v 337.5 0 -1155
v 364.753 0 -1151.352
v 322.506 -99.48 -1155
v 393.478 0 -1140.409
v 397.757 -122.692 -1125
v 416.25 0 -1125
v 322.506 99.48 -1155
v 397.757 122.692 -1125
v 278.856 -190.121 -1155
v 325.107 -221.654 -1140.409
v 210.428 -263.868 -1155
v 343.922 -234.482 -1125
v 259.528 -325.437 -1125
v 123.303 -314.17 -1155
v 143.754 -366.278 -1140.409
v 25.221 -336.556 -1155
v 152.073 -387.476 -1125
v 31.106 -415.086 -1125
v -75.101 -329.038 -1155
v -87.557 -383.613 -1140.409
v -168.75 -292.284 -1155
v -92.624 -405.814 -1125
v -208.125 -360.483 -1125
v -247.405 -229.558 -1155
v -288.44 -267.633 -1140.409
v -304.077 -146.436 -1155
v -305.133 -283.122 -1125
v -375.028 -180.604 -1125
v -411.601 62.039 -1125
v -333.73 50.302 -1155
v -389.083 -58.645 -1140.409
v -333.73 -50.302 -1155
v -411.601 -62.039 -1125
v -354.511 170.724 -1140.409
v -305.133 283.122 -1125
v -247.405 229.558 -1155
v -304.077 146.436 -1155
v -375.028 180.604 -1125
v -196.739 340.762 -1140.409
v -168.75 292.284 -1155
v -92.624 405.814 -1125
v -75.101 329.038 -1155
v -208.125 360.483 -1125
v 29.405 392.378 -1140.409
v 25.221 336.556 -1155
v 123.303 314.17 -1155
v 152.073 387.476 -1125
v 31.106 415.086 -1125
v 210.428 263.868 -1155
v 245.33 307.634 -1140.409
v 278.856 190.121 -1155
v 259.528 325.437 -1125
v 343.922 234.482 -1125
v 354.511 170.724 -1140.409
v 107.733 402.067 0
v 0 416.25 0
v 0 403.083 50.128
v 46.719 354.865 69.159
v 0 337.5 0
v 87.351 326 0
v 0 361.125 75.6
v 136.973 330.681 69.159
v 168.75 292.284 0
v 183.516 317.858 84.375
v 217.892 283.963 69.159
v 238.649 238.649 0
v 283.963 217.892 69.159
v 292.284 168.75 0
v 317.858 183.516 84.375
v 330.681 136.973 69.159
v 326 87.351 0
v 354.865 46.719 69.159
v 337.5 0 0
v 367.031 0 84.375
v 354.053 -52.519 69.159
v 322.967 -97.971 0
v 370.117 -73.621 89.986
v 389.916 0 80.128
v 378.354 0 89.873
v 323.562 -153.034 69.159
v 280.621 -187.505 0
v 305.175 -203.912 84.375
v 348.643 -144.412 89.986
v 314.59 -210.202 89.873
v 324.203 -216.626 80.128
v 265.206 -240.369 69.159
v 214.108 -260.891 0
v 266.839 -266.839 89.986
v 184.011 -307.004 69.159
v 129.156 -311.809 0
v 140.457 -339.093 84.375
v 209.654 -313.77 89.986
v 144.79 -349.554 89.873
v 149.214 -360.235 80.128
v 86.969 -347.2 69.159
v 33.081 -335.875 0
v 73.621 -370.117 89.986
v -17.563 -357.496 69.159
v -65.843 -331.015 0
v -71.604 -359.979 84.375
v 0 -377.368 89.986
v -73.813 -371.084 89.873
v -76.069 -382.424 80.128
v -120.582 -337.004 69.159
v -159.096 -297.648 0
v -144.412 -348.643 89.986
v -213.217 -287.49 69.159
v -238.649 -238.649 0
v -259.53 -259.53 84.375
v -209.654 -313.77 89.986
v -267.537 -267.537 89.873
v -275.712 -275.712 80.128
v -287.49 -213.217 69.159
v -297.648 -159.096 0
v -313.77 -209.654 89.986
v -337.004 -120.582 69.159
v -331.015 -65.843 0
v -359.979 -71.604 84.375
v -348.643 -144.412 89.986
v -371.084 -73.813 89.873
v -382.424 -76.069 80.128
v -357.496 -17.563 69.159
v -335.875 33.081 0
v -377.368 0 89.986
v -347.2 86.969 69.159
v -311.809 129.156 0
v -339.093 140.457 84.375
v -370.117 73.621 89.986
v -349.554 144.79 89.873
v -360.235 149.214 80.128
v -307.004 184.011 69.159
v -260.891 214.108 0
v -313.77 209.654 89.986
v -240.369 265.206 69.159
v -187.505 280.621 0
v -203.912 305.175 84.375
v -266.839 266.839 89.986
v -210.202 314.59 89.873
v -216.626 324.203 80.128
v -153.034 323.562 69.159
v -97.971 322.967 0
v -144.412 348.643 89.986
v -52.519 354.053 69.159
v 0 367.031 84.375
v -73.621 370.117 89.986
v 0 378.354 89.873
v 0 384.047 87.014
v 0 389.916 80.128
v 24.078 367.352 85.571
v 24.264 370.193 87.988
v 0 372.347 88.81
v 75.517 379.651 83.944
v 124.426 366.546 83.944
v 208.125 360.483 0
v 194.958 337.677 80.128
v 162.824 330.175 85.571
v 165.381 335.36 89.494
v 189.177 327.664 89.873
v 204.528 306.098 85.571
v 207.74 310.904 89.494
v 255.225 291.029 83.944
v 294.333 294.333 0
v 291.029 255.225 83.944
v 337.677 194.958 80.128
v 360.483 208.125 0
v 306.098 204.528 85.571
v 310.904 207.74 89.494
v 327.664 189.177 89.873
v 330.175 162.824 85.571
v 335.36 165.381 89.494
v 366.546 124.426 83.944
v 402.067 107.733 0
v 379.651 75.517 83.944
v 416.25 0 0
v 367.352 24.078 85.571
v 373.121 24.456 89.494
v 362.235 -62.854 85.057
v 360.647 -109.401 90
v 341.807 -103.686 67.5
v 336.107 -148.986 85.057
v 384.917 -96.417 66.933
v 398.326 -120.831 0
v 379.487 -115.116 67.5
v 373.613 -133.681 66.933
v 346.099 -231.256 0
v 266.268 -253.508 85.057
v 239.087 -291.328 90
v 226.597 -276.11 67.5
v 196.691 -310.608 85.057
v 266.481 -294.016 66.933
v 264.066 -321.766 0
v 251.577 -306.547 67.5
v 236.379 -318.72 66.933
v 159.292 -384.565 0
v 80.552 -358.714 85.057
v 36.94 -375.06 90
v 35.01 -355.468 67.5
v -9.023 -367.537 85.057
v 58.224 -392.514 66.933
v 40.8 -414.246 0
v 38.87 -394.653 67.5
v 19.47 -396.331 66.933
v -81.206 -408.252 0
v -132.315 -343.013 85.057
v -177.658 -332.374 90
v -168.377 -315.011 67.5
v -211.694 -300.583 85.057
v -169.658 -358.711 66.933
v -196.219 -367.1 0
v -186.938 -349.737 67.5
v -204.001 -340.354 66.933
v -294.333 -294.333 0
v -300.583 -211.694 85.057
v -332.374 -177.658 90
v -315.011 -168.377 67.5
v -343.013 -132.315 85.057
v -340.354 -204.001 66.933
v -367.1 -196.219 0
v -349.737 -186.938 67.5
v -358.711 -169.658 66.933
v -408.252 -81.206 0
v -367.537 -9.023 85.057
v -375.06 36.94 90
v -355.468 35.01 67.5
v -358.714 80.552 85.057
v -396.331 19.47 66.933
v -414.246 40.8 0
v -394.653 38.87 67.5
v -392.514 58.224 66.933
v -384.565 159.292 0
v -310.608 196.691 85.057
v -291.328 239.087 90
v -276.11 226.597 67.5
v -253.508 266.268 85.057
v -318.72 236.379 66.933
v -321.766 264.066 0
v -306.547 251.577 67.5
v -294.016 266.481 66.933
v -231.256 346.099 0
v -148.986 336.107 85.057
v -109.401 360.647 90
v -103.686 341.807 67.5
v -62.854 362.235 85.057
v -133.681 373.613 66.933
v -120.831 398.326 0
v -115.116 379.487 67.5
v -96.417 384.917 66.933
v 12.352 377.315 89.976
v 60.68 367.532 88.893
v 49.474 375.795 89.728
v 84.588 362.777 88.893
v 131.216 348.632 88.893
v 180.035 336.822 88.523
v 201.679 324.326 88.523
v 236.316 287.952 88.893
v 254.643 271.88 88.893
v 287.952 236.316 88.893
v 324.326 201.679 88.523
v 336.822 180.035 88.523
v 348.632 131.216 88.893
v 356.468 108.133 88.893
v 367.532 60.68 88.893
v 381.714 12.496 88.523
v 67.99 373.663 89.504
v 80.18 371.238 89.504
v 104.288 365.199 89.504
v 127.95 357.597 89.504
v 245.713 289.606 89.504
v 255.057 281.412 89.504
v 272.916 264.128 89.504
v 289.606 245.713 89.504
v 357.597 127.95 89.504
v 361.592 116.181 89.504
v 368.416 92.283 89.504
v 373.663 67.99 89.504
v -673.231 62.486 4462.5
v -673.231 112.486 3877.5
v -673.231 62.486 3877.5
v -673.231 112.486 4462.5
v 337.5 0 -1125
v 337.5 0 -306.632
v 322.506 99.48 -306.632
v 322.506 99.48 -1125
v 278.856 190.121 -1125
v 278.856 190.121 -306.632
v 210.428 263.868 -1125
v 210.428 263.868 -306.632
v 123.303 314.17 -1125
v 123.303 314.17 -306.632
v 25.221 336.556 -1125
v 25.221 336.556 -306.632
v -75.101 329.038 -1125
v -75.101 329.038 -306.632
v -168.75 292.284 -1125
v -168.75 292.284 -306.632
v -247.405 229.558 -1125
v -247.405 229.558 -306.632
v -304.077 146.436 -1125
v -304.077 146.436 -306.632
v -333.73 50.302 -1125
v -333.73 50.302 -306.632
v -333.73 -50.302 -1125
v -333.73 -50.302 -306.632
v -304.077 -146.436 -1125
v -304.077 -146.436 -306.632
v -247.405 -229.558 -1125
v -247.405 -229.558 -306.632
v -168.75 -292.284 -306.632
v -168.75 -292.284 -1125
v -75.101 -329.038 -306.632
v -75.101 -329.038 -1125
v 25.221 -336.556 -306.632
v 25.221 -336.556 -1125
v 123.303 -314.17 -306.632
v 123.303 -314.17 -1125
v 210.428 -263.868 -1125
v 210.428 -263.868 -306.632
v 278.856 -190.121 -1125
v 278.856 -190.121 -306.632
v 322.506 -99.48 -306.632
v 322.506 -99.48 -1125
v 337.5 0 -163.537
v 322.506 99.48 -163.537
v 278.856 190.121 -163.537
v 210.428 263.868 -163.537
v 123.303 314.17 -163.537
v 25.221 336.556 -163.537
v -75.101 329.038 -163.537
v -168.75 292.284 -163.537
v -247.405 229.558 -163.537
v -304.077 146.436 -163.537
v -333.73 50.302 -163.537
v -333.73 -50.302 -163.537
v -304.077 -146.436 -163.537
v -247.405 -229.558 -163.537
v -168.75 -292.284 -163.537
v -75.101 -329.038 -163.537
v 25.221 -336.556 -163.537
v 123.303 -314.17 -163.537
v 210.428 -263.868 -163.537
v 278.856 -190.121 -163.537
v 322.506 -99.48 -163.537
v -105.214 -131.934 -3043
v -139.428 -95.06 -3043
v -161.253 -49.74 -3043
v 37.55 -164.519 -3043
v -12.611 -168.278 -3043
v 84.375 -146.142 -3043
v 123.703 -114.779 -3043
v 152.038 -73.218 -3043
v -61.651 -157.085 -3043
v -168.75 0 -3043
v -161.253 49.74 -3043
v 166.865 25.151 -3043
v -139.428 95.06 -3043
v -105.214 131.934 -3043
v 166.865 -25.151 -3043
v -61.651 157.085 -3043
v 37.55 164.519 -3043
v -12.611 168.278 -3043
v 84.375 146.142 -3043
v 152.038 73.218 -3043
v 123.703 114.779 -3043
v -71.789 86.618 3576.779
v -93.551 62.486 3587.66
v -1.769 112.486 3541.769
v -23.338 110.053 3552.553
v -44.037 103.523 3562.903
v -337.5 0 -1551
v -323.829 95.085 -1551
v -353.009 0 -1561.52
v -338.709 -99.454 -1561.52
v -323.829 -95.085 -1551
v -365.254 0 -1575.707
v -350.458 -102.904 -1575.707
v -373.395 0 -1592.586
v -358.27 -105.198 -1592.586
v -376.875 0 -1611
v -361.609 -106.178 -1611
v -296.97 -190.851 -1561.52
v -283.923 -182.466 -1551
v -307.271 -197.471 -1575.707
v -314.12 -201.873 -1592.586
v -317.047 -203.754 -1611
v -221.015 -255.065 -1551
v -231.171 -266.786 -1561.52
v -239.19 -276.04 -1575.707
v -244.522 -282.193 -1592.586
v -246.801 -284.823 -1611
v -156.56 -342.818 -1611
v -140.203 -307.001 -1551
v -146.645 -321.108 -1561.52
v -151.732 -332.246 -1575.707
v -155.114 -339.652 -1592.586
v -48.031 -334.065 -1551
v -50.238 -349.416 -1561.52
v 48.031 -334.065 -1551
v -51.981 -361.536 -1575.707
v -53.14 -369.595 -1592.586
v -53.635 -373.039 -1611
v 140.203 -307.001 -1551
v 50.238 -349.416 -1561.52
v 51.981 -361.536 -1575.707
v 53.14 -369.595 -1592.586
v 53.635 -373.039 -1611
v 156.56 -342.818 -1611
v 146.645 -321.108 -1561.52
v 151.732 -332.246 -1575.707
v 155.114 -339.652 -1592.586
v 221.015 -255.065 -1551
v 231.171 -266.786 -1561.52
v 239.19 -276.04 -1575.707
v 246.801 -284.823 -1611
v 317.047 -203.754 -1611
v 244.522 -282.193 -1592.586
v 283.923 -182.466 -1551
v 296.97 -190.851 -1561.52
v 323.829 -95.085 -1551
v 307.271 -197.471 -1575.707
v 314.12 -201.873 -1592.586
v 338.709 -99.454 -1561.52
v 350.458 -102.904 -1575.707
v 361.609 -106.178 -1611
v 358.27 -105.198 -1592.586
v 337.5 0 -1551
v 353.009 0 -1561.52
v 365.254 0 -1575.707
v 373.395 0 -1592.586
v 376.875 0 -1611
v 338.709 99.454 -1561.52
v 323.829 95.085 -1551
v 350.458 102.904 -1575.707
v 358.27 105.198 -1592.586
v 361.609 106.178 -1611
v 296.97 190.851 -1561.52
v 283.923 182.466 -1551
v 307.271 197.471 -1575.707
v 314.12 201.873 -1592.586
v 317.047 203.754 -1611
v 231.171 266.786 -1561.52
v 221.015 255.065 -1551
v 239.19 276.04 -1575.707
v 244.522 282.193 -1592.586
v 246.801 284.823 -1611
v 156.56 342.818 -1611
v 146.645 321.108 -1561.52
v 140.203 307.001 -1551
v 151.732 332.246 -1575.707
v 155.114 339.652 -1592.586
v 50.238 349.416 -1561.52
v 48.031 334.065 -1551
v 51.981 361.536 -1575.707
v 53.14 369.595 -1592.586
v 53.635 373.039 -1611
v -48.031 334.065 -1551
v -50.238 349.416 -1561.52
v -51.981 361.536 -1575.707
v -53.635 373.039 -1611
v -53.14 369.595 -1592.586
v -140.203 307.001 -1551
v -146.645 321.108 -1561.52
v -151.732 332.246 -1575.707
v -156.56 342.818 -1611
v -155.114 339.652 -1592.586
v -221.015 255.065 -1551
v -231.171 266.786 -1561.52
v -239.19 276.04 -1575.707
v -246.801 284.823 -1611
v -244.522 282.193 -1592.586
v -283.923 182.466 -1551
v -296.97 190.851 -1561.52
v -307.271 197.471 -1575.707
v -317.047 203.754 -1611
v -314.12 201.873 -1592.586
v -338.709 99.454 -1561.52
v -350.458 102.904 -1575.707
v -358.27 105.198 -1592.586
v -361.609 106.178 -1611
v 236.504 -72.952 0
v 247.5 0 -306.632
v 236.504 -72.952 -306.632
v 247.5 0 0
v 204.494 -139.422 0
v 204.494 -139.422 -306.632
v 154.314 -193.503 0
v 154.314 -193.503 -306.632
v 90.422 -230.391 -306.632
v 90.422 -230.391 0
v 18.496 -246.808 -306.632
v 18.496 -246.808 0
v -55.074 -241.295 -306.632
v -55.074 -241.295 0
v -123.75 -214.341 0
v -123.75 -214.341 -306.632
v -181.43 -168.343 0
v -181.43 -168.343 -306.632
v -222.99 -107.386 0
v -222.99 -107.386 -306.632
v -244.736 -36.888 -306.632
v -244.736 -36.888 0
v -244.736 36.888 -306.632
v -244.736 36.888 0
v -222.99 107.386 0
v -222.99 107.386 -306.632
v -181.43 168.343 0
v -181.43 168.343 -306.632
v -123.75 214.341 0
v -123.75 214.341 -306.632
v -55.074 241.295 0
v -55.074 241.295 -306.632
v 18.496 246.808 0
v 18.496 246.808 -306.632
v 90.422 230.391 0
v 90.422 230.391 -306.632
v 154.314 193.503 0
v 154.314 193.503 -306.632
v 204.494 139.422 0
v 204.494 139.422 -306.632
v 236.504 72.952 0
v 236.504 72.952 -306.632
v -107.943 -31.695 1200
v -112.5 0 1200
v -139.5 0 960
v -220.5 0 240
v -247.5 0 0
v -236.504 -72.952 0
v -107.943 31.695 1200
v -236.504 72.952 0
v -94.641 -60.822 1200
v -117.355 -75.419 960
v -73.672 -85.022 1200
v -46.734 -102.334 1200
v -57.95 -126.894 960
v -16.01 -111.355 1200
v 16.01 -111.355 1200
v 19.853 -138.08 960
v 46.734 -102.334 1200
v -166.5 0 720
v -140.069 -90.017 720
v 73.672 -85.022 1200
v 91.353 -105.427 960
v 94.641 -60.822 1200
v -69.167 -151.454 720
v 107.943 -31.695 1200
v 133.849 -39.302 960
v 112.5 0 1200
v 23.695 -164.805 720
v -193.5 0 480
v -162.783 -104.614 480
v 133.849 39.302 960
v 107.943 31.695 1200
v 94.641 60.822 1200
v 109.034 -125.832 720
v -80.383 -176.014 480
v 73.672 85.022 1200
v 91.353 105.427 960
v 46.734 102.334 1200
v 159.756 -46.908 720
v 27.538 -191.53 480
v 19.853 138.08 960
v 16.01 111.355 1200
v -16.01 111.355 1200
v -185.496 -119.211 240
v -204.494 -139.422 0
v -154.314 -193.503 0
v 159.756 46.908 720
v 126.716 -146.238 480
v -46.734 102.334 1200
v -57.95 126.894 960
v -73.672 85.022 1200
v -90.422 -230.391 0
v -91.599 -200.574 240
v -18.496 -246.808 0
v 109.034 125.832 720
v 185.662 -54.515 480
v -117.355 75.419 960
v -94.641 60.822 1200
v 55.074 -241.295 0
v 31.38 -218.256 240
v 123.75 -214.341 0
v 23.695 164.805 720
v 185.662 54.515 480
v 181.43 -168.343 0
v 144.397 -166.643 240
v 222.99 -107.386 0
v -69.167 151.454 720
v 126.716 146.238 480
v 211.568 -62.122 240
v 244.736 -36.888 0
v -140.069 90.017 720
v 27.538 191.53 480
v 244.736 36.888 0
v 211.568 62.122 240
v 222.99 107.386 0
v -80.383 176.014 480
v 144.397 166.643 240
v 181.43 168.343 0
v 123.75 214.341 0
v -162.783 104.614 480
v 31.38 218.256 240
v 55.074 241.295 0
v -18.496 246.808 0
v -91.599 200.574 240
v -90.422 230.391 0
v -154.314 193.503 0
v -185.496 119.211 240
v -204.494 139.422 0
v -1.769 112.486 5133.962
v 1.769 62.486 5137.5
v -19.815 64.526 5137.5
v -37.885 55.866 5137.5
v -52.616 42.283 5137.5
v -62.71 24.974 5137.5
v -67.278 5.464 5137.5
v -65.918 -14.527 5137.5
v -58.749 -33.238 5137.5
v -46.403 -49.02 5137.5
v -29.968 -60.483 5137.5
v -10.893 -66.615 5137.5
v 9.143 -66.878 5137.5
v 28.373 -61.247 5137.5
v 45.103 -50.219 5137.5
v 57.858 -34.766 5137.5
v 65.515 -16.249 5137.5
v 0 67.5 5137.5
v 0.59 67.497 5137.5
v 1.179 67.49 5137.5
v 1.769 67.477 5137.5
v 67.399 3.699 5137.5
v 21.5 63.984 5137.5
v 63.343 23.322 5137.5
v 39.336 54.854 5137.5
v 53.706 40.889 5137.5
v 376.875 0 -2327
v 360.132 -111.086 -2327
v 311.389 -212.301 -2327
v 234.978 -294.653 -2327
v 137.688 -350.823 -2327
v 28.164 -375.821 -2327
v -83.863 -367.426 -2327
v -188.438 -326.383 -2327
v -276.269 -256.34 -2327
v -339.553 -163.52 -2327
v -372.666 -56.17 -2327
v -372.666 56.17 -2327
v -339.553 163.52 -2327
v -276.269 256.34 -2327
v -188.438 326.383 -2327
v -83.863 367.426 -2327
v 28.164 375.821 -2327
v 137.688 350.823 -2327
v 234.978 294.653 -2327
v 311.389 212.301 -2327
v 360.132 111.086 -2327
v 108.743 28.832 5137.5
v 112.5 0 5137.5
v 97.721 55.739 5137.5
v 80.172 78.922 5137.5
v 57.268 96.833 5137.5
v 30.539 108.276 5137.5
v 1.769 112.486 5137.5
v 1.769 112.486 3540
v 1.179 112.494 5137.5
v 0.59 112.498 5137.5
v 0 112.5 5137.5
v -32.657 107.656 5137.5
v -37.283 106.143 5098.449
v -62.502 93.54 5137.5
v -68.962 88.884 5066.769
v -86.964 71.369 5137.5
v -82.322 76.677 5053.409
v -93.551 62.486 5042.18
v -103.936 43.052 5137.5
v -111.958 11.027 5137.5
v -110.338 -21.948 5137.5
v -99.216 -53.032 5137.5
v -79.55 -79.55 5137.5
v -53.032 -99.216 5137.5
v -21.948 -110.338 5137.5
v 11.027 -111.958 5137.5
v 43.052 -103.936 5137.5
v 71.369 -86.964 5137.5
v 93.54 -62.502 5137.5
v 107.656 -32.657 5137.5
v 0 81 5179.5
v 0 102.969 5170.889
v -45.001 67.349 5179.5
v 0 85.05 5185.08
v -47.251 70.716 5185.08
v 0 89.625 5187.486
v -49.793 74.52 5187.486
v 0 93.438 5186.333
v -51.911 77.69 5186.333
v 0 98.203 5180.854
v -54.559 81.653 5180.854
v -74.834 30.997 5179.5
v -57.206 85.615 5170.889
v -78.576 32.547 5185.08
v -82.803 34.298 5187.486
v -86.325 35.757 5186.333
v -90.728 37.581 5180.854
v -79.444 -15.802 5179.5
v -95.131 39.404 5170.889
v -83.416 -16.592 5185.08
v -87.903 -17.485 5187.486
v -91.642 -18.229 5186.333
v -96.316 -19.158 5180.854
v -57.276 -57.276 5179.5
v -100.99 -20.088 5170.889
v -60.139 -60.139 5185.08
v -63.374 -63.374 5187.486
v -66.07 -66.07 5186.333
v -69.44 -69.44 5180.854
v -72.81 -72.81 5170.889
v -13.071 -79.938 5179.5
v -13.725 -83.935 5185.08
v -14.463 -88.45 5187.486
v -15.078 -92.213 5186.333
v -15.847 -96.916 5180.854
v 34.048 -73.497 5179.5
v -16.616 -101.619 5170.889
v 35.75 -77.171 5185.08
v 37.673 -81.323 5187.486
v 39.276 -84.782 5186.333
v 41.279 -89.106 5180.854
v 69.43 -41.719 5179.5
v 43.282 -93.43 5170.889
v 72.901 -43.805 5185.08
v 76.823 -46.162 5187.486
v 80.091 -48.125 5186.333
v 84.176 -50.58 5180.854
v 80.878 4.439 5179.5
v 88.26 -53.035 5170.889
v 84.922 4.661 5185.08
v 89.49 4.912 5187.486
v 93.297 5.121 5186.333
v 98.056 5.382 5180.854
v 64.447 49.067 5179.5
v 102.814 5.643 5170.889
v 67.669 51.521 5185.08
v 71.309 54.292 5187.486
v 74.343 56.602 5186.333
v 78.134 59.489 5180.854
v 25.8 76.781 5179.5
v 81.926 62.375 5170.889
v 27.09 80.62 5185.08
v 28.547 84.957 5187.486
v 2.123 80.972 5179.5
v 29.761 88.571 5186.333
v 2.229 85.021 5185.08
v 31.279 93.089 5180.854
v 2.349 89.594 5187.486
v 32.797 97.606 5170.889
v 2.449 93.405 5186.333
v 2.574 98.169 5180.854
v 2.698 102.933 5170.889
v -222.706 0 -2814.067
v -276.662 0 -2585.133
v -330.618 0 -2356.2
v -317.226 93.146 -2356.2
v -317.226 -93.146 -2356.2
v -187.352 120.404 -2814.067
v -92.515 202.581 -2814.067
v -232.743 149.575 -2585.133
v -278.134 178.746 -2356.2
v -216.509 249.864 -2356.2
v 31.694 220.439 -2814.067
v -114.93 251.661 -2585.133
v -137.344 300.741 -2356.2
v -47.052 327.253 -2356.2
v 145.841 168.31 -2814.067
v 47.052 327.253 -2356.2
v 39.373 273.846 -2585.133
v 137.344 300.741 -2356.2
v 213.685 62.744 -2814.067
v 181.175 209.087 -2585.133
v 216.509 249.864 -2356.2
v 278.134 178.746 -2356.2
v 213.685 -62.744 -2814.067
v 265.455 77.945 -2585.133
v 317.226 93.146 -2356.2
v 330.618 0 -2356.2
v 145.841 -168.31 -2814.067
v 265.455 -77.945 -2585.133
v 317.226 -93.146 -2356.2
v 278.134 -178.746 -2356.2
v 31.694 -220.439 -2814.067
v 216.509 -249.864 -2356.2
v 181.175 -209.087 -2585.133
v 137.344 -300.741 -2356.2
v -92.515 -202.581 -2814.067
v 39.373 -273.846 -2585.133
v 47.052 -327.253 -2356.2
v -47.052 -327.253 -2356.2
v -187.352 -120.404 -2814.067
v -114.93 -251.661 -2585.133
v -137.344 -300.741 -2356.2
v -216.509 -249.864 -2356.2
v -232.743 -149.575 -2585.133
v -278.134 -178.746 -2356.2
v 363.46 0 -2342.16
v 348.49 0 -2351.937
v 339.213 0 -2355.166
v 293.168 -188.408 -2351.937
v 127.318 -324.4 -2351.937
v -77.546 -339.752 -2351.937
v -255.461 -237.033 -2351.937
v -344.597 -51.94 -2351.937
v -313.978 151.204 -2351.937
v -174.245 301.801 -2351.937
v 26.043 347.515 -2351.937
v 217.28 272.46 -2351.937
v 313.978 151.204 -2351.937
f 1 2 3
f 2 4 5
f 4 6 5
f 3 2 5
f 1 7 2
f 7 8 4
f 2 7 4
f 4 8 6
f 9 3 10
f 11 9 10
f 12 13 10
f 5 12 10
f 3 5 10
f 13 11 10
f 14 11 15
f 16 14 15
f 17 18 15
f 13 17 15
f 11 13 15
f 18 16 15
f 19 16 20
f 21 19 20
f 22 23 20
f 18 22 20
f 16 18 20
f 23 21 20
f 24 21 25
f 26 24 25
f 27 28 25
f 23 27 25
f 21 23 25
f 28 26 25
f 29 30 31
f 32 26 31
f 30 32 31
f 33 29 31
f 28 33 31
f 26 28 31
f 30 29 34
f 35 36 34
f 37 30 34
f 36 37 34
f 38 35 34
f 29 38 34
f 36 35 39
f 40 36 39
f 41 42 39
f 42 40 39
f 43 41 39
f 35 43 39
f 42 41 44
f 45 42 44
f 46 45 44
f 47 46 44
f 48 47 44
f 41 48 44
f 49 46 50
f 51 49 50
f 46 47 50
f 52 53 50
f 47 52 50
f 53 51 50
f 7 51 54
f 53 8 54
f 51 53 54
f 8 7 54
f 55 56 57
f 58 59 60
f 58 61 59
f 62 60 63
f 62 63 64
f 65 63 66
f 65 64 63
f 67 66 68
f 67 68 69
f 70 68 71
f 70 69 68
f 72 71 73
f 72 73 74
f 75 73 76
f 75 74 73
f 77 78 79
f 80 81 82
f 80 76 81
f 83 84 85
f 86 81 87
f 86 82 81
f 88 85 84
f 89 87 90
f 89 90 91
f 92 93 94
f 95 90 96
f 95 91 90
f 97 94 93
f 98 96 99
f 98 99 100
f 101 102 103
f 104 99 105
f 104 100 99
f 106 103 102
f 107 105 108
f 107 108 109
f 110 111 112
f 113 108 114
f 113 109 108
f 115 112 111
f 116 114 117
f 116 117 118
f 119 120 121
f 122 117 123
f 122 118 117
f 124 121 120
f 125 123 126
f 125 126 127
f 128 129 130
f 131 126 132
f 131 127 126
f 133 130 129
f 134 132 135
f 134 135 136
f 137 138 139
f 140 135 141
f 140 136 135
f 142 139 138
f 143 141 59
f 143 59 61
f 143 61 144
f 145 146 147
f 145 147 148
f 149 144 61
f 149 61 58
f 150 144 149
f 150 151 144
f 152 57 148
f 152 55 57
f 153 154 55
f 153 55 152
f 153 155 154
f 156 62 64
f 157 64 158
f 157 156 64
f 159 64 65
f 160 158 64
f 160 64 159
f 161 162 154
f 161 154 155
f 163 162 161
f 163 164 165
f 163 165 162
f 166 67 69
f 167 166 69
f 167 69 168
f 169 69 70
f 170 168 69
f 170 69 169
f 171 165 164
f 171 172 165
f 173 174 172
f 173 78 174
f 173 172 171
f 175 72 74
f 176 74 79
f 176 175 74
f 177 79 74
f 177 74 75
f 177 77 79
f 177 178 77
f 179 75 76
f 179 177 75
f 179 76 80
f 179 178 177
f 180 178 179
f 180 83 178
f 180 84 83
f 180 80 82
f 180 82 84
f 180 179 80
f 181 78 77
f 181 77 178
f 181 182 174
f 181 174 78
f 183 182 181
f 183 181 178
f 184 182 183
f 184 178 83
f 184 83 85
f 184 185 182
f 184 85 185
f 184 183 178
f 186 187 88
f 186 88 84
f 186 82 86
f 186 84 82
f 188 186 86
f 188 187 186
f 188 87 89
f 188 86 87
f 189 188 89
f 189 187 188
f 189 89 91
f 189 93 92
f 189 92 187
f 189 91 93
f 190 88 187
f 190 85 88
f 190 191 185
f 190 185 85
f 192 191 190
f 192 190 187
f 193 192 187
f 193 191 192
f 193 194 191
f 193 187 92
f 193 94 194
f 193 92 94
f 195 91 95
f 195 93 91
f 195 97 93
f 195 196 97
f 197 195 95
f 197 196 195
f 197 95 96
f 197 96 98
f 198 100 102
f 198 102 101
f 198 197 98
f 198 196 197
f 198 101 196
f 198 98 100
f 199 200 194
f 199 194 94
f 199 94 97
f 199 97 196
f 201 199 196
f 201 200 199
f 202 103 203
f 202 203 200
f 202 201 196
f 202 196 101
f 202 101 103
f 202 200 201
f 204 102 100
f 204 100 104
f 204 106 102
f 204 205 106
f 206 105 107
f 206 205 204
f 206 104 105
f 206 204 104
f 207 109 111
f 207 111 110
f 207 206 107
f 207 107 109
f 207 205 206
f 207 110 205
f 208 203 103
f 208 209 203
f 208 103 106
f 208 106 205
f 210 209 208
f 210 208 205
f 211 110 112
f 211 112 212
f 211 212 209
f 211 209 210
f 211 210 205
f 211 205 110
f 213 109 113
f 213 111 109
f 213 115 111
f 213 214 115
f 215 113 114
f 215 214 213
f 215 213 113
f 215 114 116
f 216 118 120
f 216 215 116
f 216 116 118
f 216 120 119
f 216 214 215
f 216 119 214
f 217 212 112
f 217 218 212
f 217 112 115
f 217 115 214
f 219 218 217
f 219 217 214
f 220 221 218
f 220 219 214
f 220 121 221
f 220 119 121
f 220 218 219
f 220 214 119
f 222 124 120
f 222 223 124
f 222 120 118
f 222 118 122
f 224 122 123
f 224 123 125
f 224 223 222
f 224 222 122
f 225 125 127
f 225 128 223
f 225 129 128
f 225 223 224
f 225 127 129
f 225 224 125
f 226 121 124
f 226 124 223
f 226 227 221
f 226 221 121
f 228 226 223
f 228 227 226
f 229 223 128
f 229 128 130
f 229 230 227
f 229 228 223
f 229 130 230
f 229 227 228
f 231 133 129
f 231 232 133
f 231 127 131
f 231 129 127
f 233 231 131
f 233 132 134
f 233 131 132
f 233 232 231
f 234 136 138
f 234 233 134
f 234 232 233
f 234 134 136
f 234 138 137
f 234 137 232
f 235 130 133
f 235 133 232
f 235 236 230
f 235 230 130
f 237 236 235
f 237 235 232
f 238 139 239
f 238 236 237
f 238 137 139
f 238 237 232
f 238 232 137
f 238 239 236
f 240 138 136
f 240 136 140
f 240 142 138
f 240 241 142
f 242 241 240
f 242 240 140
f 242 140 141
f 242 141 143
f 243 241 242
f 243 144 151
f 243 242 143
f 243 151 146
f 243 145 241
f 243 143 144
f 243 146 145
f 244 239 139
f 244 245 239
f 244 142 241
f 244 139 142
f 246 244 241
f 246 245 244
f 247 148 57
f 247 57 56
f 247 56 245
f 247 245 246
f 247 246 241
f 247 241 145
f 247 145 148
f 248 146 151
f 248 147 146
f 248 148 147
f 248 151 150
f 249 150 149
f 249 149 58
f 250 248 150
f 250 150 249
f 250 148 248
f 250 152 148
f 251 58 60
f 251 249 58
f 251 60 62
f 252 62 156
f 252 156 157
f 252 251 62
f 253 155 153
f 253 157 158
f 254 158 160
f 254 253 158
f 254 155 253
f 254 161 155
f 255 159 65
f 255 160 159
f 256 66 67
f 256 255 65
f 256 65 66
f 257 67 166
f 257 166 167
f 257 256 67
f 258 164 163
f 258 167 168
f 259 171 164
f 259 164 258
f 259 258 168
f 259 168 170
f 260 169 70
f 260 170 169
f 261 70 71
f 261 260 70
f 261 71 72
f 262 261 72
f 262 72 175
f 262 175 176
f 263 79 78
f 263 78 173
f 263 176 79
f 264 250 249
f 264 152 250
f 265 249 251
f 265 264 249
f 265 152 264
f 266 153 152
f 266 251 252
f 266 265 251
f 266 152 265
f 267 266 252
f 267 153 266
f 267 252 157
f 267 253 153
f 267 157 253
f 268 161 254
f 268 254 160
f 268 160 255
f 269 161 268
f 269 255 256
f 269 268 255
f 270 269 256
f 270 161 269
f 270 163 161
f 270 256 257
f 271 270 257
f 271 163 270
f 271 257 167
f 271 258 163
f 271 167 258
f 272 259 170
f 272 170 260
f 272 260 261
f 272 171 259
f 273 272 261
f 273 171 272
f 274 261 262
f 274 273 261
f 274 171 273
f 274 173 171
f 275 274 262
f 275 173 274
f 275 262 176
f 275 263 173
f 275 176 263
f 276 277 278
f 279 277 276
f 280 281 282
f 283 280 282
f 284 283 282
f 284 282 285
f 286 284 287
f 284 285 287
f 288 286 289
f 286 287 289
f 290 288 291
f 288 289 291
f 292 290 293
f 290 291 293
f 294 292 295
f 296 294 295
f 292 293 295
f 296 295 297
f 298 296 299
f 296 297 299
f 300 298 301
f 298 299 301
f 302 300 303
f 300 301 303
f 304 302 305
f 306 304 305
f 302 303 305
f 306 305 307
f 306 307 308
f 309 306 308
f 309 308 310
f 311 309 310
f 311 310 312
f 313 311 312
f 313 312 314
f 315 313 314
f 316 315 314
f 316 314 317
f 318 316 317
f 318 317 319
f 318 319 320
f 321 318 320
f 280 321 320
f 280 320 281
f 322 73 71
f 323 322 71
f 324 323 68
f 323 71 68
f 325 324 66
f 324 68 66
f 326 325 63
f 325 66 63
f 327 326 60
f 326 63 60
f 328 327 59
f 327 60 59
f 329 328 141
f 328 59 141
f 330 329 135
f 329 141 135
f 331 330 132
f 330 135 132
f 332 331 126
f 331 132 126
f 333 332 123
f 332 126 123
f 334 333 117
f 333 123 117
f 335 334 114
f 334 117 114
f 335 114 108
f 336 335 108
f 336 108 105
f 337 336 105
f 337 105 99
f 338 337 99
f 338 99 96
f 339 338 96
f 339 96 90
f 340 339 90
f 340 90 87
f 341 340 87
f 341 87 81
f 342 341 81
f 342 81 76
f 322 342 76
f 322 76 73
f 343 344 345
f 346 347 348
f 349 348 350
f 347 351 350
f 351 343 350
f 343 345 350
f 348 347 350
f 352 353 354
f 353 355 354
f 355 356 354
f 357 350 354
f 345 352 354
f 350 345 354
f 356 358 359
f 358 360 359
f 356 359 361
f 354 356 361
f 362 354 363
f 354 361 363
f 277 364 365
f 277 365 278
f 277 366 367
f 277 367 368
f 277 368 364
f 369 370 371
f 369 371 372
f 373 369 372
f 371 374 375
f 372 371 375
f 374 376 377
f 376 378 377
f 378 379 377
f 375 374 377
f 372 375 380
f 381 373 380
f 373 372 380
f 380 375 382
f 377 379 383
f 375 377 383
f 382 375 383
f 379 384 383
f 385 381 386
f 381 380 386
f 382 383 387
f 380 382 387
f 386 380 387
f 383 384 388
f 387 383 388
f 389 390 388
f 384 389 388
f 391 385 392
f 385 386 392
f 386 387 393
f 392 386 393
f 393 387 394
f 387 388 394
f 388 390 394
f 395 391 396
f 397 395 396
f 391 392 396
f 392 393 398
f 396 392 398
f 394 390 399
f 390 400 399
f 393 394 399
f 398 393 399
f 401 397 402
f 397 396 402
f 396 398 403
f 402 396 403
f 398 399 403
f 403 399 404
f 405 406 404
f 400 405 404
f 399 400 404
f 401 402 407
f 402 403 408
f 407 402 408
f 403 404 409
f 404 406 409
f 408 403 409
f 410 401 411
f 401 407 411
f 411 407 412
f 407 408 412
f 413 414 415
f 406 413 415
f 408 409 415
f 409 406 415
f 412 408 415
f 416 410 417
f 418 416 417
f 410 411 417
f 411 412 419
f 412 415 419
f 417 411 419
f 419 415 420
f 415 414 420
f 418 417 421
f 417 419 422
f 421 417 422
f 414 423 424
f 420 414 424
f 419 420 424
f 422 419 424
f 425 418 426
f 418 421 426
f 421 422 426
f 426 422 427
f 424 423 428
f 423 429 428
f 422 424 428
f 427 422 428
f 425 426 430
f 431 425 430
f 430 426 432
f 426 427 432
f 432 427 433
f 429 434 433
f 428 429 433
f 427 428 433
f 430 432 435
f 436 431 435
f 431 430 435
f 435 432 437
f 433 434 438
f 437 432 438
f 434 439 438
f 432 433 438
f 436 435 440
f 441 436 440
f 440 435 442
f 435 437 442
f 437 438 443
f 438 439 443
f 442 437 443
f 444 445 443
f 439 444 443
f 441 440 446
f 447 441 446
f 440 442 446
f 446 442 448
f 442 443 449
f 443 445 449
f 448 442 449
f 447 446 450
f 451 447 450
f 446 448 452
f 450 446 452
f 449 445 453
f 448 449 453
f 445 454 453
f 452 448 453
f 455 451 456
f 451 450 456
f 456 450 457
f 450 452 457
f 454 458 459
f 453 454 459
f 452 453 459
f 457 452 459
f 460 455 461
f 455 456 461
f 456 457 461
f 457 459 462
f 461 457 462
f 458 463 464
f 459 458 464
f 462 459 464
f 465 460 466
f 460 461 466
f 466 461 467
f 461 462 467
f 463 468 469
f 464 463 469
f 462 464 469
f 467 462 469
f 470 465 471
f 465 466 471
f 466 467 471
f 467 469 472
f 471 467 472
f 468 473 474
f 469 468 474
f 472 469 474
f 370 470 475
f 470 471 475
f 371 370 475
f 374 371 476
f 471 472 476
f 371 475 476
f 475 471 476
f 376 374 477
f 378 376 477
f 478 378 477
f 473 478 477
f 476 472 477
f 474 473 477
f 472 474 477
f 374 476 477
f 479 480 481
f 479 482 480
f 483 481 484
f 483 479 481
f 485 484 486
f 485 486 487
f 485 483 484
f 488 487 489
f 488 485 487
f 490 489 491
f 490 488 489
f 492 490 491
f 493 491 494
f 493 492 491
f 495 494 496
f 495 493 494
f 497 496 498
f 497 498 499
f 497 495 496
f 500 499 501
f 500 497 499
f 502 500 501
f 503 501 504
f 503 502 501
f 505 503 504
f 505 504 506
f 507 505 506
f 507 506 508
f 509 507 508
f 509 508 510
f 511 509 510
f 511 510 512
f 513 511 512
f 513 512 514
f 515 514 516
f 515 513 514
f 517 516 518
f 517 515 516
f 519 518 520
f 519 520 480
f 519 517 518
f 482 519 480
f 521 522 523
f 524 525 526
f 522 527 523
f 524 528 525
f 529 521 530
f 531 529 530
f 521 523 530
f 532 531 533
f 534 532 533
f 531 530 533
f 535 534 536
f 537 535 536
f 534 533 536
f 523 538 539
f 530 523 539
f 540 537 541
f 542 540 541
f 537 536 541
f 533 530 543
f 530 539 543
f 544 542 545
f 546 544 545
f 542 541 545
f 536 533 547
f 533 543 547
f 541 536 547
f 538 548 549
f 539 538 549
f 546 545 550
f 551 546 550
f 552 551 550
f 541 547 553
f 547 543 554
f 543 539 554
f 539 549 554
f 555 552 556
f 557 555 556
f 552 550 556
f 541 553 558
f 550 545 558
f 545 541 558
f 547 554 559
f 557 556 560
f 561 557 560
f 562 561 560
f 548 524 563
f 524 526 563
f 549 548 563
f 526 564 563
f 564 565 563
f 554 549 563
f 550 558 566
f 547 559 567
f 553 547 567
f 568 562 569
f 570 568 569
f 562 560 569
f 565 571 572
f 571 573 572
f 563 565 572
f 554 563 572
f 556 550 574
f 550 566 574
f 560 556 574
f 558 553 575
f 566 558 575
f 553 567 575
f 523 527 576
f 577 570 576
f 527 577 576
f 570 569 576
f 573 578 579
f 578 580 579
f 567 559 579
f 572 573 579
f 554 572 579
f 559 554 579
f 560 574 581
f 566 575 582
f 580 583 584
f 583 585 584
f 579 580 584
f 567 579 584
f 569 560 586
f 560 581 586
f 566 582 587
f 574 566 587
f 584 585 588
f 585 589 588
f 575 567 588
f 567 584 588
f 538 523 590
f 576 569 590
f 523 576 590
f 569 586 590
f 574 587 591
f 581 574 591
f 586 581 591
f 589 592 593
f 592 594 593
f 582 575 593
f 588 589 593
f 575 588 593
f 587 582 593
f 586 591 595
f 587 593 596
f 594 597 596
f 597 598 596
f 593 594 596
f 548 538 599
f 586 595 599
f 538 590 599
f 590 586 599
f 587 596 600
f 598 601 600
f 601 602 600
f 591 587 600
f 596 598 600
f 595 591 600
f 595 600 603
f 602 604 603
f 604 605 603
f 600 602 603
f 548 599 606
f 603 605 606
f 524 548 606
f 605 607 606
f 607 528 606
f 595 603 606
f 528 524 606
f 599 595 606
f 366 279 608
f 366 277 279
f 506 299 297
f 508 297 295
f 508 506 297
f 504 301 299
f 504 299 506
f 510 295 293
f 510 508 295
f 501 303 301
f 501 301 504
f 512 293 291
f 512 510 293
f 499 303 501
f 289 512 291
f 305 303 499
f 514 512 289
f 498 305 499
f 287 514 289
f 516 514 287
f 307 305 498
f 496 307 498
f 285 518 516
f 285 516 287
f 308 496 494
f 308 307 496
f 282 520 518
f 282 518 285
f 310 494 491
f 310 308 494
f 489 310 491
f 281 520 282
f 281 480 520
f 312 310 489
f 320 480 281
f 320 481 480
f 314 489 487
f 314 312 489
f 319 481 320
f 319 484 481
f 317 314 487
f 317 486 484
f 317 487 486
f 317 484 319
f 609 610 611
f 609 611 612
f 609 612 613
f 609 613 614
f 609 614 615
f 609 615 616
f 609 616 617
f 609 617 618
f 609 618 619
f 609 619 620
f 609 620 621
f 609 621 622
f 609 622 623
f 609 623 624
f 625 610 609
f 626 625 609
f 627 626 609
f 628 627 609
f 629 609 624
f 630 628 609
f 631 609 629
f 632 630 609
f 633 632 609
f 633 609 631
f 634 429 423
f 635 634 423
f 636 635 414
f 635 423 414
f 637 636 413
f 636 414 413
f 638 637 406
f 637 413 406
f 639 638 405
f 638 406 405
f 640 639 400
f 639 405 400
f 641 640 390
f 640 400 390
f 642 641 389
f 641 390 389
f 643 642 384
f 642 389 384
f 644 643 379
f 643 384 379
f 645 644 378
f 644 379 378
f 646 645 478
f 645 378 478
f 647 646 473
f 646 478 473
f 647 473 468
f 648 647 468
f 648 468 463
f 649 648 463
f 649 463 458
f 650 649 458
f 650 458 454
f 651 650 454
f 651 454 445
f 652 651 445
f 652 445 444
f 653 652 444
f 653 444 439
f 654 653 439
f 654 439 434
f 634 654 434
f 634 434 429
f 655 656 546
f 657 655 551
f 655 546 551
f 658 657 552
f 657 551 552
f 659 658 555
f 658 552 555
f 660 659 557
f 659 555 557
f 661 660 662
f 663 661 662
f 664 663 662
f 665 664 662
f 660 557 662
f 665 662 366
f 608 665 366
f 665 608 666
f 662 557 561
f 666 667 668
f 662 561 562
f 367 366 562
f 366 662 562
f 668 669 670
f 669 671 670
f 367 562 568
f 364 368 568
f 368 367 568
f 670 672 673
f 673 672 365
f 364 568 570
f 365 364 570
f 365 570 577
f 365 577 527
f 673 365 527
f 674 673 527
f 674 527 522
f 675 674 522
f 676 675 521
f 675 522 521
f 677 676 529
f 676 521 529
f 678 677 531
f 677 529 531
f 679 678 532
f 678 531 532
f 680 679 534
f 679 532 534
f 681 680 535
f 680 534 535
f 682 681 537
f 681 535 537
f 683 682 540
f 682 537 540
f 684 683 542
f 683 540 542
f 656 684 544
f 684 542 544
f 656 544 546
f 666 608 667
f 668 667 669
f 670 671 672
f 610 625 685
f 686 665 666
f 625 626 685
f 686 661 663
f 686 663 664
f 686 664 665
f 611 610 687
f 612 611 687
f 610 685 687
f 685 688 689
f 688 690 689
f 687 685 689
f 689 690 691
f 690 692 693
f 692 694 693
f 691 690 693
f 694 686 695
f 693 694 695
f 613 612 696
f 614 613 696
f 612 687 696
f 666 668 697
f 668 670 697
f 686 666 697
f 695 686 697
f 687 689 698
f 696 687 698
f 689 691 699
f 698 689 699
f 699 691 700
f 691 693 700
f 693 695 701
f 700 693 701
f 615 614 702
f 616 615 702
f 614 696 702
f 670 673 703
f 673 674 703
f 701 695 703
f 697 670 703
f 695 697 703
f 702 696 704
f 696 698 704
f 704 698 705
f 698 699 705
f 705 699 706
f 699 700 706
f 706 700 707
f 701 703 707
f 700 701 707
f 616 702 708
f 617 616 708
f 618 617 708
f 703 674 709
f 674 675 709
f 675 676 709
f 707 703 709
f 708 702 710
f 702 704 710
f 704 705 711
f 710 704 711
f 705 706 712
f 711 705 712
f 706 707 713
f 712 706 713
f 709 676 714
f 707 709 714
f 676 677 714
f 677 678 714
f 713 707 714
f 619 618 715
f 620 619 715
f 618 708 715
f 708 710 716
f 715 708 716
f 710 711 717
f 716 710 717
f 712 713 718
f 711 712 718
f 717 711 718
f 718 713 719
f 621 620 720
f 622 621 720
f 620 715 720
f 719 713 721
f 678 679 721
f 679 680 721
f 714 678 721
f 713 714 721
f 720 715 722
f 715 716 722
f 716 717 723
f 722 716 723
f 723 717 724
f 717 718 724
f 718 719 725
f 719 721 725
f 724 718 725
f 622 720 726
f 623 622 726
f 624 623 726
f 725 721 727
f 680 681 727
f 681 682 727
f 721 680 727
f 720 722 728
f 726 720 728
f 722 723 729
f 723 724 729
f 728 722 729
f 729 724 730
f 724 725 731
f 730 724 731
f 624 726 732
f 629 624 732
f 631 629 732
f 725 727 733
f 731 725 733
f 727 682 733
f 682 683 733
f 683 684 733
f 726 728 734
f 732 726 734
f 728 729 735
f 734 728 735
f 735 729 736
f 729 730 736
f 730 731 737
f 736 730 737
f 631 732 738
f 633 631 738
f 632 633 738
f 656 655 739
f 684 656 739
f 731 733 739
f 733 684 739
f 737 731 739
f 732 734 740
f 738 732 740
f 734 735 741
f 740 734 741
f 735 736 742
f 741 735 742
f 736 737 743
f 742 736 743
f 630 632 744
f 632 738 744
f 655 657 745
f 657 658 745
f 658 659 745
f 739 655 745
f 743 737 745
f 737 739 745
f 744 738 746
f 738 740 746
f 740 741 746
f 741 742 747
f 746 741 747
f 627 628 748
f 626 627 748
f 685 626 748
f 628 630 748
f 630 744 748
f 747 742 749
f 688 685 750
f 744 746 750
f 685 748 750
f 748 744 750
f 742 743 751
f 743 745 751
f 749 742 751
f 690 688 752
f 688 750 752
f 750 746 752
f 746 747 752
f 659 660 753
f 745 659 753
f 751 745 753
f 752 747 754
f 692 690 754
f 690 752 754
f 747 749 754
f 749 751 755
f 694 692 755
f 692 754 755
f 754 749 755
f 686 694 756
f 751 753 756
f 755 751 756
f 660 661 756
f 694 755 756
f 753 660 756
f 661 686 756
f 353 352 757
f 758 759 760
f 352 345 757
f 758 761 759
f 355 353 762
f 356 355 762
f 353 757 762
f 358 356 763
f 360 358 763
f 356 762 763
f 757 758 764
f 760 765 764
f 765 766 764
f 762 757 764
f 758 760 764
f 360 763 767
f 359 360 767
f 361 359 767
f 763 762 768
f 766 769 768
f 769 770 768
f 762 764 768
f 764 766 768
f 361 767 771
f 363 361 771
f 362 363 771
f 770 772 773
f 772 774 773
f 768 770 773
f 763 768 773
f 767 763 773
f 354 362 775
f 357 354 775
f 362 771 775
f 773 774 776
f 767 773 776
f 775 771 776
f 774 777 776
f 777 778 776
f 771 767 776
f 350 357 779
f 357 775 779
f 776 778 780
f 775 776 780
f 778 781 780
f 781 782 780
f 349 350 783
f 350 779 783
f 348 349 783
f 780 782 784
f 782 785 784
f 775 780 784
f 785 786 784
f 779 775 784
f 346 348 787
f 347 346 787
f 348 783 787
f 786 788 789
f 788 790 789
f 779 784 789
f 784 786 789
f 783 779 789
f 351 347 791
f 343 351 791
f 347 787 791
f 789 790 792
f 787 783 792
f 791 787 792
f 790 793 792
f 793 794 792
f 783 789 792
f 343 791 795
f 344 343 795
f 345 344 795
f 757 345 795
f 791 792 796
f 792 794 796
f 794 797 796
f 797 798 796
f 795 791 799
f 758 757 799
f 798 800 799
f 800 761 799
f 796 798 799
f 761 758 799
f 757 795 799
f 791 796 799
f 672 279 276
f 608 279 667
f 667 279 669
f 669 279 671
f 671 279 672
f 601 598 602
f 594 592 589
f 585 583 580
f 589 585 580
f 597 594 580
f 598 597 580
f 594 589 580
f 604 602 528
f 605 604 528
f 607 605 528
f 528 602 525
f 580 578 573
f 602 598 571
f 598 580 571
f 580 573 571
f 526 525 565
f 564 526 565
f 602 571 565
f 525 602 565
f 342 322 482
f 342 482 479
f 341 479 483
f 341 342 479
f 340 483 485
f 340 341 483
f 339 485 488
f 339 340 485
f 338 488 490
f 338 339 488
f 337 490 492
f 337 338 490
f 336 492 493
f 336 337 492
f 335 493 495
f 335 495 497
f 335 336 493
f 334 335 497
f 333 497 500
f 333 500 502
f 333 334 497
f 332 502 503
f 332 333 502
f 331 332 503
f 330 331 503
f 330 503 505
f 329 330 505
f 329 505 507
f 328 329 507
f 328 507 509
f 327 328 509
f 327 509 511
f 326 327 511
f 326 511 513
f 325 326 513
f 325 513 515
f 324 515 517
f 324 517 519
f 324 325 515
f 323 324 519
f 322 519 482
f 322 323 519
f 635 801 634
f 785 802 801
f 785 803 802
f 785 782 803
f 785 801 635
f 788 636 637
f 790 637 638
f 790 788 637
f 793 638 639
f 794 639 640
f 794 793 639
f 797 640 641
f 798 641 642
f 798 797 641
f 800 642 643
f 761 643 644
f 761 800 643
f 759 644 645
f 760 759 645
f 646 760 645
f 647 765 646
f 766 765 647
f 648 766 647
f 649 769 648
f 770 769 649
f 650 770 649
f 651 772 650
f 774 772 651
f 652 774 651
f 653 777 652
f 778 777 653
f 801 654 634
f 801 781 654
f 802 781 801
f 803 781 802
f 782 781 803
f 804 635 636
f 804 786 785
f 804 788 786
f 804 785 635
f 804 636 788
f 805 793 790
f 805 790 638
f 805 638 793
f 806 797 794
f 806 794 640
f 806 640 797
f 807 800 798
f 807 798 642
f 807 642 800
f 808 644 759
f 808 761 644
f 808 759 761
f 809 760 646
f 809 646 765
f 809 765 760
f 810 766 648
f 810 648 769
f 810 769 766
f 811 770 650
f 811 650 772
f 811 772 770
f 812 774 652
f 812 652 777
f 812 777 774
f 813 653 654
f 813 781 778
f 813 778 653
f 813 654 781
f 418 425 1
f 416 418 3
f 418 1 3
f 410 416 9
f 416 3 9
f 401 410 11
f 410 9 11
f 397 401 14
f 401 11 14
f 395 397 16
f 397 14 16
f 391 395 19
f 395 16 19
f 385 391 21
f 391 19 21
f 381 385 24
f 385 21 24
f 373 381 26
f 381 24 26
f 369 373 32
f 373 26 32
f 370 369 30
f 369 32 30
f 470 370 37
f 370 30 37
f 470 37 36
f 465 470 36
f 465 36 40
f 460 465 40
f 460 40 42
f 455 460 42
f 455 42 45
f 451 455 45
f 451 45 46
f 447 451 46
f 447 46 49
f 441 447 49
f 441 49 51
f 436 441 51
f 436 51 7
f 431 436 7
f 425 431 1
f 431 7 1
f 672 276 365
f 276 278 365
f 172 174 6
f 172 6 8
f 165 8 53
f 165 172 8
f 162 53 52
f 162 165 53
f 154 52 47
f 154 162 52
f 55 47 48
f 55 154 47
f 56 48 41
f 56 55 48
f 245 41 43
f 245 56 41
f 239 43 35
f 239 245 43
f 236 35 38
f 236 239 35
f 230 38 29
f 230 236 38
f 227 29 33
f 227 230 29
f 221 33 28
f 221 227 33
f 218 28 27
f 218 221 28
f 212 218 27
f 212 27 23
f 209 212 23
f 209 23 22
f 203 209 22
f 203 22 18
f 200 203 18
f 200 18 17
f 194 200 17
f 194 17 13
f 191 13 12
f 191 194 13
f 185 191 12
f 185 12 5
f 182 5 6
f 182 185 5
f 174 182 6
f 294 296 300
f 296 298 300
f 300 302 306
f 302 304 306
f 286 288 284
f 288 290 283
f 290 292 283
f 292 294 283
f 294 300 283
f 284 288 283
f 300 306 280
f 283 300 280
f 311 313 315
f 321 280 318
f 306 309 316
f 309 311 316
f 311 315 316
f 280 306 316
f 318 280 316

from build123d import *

# Parameters (mm, degrees)
SKETCH1_R           = 416.25
SKETCH1_R_2         = 337.5
BOSS_EXTRUDE1_DEPTH = 1125
SKETCH5_R           = 112.5
BOSS_EXTRUDE2_DEPTH = 3937.5
SKETCH15_R          = 337.5
BOSS_EXTRUDE5_DEPTH = 486
SKETCH16_R          = 376.875
BOSS_EXTRUDE6_DEPTH = 716
BOSS_EXTRUDE7_DEPTH = 50


with BuildPart() as part:
    # Sketch1 → Boss-Extrude1 (new body)
    with BuildSketch(Plane.XY):
        Circle(SKETCH1_R)
        Circle(SKETCH1_R_2, mode=Mode.SUBTRACT)
    extrude(amount=-BOSS_EXTRUDE1_DEPTH)

    # Sketch2 → Revolve1 (revolve)
    with BuildSketch(Plane(origin=(0, 0, 0), x_dir=(0, 0, -1), z_dir=(1, 0, 0))):
        with BuildLine():
            Line((0, 416.25), (0, 337.5))
            add(Edge.make_bspline(
                [(0, 337.5), (-180, 376.875), (0, 416.25)],
                knots=[0, 0, 0, 1, 1, 1], degree=2))
        make_face()
    revolve(axis=Axis((0, 0, 0), (0, 0, -1)))

    # Sketch18 → Revolve6 (revolve)
    with BuildSketch(Plane(origin=(0, 0, 0), x_dir=(0, 0, -1), z_dir=(1, 0, 0)), mode=Mode.PRIVATE) as revolve6_sk:
        Polygon((0, 247.5), (306.632414301, 416.25), (306.632414301, 247.5), align=None)
    revolve(revolve6_sk.sketch.rotate(Axis((0, 0, 0), (0, 0, -1)), 90), axis=Axis((0, 0, 0), (0, 0, -1)))



with BuildPart() as body_2:
    # Sketch4 → Revolve2 (revolve)
    with BuildSketch(Plane(origin=(0, 0, 0), x_dir=(1, 0, 0), z_dir=(0, 1, 0)), mode=Mode.PRIVATE) as revolve2_sk:
        Polygon((0, 0), (0, -1200), (112.5, -1200), (247.5, 0), align=None)
    revolve(revolve2_sk.sketch.rotate(Axis((0, 0, 0), (0, 0, 1)), 180), axis=Axis((0, 0, 0), (0, 0, 1)))

    # Sketch5 → Boss-Extrude2 (add)
    with BuildSketch(Plane.XY.offset(1200)):
        Circle(SKETCH5_R)
    extrude(amount=BOSS_EXTRUDE2_DEPTH)

    # Sketch14 → Revolve4 (revolve)
    with BuildSketch(Plane(origin=(0, 0, 0), x_dir=(0, 0, -1), z_dir=(1, 0, 0))):
        with BuildLine():
            add(Edge.make_bspline(
                [(-5137.5, 67.5), (-5237.5, 90), (-5137.5, 112.5)],
                knots=[0, 0, 0, 1, 1, 1], degree=2))
            Line((-5137.5, 112.5), (-5137.5, 67.5))
        make_face()
    revolve(axis=Axis((0, 0, 5137.5), (0, 0, 1)))

    # Sketch22 → Boss-Extrude7 (add)
    with BuildSketch(Plane(origin=(0, 112.486092048, 0), x_dir=(1, 0, 0), z_dir=(0, 1, 0))):
        Polygon((1.768925034, -5137.5), (1.768925034, -3540), (-673.231074966, -3877.5), (-673.231074966, -4462.5), align=None)
    extrude(amount=-BOSS_EXTRUDE7_DEPTH)


with BuildPart() as body_3:
    # Sketch15 → Boss-Extrude5 (new body)
    with BuildSketch(Plane(origin=(0, 0, -1125), x_dir=(-1, 0, 0), z_dir=(0, 0, -1))):
        with Locations(Location((0, 0, 0), (0, 0, 180))):
            Circle(SKETCH15_R)
    extrude(amount=BOSS_EXTRUDE5_DEPTH)

    # Sketch16 → Boss-Extrude6 (add)
    with BuildSketch(Plane(origin=(0, 0, -1611), x_dir=(-1, 0, 0), z_dir=(0, 0, -1))):
        with Locations(Location((0, 0, 0), (0, 0, 180))):
            Circle(SKETCH16_R)
    extrude(amount=BOSS_EXTRUDE6_DEPTH)

    # Sketch17 → Revolve5 (revolve)
    with BuildSketch(Plane(origin=(0, 0, 0), x_dir=(0, 0, -1), z_dir=(1, 0, 0)), mode=Mode.PRIVATE) as revolve5_sk:
        Polygon((2327, 0), (3043, 0), (3043, 168.75), (2327, 337.5), align=None)
    revolve(revolve5_sk.sketch.rotate(Axis((0, 0, -2327), (0, 0, -1)), 270), axis=Axis((0, 0, -2327), (0, 0, -1)))

    # Sketch19 → Revolve9 (revolve)
    with BuildSketch(Plane(origin=(0, 0, 0), x_dir=(0, 0, -1), z_dir=(1, 0, 0)), mode=Mode.PRIVATE) as revolve9_sk:
        with BuildLine():
            Line((1611, 337.5), (1551, 337.5))
            ThreePointArc((1551, 337.5), (1575.706535425, 365.253731733), (1611, 376.875))
            Line((1611, 376.875), (1611, 337.5))
        make_face()
    revolve(revolve9_sk.sketch.rotate(Axis((0, 0, -1611), (0, 0, 1)), 90), axis=Axis((0, 0, -1611), (0, 0, 1)))


with BuildPart() as part_1:
    add(part.part)

    add(body_3.part)  # Revolve11 merges body 3
    # Sketch20 → Revolve11 (revolve)
    with BuildSketch(Plane(origin=(0, 0, 0), x_dir=(0, 0, -1), z_dir=(1, 0, 0)), mode=Mode.PRIVATE) as revolve11_sk:
        with BuildLine():
            Line((1125, 337.5), (1125, 416.25))
            add(Edge.make_bspline(
                [(1155, 337.5), (1155, 382.589285714), (1125, 416.25)],
                knots=[0, 0, 0, 1, 1, 1], degree=2, weights=[1, 0.806097206, 1]))
            Line((1155, 337.5), (1125, 337.5))
        make_face()
    revolve(revolve11_sk.sketch.rotate(Axis((0, 0, -1125), (0, 0, -1)), 90), axis=Axis((0, 0, -1125), (0, 0, -1)))

    # Sketch21 → Revolve12 (revolve)
    with BuildSketch(Plane(origin=(0, 0, 0), x_dir=(0, 0, -1), z_dir=(1, 0, 0)), mode=Mode.PRIVATE) as revolve12_sk:
        with BuildLine():
            Line((2327, 337.5), (2327, 376.875))
            add(Edge.make_bspline(
                [(2327, 376.875), (2356.199972531, 357.1875), (2356.199972531, 330.618023234)],
                knots=[0, 0, 0, 1, 1, 1], degree=2, weights=[1, 0.829833158, 1]))
            Line((2356.199972531, 330.618023234), (2327, 337.5))
        make_face()
    revolve(revolve12_sk.sketch.rotate(Axis((0, 0, -2327), (0, 0, -1)), 90), axis=Axis((0, 0, -2327), (0, 0, -1)))


solid = Compound([body_2.part, part_1.part])
